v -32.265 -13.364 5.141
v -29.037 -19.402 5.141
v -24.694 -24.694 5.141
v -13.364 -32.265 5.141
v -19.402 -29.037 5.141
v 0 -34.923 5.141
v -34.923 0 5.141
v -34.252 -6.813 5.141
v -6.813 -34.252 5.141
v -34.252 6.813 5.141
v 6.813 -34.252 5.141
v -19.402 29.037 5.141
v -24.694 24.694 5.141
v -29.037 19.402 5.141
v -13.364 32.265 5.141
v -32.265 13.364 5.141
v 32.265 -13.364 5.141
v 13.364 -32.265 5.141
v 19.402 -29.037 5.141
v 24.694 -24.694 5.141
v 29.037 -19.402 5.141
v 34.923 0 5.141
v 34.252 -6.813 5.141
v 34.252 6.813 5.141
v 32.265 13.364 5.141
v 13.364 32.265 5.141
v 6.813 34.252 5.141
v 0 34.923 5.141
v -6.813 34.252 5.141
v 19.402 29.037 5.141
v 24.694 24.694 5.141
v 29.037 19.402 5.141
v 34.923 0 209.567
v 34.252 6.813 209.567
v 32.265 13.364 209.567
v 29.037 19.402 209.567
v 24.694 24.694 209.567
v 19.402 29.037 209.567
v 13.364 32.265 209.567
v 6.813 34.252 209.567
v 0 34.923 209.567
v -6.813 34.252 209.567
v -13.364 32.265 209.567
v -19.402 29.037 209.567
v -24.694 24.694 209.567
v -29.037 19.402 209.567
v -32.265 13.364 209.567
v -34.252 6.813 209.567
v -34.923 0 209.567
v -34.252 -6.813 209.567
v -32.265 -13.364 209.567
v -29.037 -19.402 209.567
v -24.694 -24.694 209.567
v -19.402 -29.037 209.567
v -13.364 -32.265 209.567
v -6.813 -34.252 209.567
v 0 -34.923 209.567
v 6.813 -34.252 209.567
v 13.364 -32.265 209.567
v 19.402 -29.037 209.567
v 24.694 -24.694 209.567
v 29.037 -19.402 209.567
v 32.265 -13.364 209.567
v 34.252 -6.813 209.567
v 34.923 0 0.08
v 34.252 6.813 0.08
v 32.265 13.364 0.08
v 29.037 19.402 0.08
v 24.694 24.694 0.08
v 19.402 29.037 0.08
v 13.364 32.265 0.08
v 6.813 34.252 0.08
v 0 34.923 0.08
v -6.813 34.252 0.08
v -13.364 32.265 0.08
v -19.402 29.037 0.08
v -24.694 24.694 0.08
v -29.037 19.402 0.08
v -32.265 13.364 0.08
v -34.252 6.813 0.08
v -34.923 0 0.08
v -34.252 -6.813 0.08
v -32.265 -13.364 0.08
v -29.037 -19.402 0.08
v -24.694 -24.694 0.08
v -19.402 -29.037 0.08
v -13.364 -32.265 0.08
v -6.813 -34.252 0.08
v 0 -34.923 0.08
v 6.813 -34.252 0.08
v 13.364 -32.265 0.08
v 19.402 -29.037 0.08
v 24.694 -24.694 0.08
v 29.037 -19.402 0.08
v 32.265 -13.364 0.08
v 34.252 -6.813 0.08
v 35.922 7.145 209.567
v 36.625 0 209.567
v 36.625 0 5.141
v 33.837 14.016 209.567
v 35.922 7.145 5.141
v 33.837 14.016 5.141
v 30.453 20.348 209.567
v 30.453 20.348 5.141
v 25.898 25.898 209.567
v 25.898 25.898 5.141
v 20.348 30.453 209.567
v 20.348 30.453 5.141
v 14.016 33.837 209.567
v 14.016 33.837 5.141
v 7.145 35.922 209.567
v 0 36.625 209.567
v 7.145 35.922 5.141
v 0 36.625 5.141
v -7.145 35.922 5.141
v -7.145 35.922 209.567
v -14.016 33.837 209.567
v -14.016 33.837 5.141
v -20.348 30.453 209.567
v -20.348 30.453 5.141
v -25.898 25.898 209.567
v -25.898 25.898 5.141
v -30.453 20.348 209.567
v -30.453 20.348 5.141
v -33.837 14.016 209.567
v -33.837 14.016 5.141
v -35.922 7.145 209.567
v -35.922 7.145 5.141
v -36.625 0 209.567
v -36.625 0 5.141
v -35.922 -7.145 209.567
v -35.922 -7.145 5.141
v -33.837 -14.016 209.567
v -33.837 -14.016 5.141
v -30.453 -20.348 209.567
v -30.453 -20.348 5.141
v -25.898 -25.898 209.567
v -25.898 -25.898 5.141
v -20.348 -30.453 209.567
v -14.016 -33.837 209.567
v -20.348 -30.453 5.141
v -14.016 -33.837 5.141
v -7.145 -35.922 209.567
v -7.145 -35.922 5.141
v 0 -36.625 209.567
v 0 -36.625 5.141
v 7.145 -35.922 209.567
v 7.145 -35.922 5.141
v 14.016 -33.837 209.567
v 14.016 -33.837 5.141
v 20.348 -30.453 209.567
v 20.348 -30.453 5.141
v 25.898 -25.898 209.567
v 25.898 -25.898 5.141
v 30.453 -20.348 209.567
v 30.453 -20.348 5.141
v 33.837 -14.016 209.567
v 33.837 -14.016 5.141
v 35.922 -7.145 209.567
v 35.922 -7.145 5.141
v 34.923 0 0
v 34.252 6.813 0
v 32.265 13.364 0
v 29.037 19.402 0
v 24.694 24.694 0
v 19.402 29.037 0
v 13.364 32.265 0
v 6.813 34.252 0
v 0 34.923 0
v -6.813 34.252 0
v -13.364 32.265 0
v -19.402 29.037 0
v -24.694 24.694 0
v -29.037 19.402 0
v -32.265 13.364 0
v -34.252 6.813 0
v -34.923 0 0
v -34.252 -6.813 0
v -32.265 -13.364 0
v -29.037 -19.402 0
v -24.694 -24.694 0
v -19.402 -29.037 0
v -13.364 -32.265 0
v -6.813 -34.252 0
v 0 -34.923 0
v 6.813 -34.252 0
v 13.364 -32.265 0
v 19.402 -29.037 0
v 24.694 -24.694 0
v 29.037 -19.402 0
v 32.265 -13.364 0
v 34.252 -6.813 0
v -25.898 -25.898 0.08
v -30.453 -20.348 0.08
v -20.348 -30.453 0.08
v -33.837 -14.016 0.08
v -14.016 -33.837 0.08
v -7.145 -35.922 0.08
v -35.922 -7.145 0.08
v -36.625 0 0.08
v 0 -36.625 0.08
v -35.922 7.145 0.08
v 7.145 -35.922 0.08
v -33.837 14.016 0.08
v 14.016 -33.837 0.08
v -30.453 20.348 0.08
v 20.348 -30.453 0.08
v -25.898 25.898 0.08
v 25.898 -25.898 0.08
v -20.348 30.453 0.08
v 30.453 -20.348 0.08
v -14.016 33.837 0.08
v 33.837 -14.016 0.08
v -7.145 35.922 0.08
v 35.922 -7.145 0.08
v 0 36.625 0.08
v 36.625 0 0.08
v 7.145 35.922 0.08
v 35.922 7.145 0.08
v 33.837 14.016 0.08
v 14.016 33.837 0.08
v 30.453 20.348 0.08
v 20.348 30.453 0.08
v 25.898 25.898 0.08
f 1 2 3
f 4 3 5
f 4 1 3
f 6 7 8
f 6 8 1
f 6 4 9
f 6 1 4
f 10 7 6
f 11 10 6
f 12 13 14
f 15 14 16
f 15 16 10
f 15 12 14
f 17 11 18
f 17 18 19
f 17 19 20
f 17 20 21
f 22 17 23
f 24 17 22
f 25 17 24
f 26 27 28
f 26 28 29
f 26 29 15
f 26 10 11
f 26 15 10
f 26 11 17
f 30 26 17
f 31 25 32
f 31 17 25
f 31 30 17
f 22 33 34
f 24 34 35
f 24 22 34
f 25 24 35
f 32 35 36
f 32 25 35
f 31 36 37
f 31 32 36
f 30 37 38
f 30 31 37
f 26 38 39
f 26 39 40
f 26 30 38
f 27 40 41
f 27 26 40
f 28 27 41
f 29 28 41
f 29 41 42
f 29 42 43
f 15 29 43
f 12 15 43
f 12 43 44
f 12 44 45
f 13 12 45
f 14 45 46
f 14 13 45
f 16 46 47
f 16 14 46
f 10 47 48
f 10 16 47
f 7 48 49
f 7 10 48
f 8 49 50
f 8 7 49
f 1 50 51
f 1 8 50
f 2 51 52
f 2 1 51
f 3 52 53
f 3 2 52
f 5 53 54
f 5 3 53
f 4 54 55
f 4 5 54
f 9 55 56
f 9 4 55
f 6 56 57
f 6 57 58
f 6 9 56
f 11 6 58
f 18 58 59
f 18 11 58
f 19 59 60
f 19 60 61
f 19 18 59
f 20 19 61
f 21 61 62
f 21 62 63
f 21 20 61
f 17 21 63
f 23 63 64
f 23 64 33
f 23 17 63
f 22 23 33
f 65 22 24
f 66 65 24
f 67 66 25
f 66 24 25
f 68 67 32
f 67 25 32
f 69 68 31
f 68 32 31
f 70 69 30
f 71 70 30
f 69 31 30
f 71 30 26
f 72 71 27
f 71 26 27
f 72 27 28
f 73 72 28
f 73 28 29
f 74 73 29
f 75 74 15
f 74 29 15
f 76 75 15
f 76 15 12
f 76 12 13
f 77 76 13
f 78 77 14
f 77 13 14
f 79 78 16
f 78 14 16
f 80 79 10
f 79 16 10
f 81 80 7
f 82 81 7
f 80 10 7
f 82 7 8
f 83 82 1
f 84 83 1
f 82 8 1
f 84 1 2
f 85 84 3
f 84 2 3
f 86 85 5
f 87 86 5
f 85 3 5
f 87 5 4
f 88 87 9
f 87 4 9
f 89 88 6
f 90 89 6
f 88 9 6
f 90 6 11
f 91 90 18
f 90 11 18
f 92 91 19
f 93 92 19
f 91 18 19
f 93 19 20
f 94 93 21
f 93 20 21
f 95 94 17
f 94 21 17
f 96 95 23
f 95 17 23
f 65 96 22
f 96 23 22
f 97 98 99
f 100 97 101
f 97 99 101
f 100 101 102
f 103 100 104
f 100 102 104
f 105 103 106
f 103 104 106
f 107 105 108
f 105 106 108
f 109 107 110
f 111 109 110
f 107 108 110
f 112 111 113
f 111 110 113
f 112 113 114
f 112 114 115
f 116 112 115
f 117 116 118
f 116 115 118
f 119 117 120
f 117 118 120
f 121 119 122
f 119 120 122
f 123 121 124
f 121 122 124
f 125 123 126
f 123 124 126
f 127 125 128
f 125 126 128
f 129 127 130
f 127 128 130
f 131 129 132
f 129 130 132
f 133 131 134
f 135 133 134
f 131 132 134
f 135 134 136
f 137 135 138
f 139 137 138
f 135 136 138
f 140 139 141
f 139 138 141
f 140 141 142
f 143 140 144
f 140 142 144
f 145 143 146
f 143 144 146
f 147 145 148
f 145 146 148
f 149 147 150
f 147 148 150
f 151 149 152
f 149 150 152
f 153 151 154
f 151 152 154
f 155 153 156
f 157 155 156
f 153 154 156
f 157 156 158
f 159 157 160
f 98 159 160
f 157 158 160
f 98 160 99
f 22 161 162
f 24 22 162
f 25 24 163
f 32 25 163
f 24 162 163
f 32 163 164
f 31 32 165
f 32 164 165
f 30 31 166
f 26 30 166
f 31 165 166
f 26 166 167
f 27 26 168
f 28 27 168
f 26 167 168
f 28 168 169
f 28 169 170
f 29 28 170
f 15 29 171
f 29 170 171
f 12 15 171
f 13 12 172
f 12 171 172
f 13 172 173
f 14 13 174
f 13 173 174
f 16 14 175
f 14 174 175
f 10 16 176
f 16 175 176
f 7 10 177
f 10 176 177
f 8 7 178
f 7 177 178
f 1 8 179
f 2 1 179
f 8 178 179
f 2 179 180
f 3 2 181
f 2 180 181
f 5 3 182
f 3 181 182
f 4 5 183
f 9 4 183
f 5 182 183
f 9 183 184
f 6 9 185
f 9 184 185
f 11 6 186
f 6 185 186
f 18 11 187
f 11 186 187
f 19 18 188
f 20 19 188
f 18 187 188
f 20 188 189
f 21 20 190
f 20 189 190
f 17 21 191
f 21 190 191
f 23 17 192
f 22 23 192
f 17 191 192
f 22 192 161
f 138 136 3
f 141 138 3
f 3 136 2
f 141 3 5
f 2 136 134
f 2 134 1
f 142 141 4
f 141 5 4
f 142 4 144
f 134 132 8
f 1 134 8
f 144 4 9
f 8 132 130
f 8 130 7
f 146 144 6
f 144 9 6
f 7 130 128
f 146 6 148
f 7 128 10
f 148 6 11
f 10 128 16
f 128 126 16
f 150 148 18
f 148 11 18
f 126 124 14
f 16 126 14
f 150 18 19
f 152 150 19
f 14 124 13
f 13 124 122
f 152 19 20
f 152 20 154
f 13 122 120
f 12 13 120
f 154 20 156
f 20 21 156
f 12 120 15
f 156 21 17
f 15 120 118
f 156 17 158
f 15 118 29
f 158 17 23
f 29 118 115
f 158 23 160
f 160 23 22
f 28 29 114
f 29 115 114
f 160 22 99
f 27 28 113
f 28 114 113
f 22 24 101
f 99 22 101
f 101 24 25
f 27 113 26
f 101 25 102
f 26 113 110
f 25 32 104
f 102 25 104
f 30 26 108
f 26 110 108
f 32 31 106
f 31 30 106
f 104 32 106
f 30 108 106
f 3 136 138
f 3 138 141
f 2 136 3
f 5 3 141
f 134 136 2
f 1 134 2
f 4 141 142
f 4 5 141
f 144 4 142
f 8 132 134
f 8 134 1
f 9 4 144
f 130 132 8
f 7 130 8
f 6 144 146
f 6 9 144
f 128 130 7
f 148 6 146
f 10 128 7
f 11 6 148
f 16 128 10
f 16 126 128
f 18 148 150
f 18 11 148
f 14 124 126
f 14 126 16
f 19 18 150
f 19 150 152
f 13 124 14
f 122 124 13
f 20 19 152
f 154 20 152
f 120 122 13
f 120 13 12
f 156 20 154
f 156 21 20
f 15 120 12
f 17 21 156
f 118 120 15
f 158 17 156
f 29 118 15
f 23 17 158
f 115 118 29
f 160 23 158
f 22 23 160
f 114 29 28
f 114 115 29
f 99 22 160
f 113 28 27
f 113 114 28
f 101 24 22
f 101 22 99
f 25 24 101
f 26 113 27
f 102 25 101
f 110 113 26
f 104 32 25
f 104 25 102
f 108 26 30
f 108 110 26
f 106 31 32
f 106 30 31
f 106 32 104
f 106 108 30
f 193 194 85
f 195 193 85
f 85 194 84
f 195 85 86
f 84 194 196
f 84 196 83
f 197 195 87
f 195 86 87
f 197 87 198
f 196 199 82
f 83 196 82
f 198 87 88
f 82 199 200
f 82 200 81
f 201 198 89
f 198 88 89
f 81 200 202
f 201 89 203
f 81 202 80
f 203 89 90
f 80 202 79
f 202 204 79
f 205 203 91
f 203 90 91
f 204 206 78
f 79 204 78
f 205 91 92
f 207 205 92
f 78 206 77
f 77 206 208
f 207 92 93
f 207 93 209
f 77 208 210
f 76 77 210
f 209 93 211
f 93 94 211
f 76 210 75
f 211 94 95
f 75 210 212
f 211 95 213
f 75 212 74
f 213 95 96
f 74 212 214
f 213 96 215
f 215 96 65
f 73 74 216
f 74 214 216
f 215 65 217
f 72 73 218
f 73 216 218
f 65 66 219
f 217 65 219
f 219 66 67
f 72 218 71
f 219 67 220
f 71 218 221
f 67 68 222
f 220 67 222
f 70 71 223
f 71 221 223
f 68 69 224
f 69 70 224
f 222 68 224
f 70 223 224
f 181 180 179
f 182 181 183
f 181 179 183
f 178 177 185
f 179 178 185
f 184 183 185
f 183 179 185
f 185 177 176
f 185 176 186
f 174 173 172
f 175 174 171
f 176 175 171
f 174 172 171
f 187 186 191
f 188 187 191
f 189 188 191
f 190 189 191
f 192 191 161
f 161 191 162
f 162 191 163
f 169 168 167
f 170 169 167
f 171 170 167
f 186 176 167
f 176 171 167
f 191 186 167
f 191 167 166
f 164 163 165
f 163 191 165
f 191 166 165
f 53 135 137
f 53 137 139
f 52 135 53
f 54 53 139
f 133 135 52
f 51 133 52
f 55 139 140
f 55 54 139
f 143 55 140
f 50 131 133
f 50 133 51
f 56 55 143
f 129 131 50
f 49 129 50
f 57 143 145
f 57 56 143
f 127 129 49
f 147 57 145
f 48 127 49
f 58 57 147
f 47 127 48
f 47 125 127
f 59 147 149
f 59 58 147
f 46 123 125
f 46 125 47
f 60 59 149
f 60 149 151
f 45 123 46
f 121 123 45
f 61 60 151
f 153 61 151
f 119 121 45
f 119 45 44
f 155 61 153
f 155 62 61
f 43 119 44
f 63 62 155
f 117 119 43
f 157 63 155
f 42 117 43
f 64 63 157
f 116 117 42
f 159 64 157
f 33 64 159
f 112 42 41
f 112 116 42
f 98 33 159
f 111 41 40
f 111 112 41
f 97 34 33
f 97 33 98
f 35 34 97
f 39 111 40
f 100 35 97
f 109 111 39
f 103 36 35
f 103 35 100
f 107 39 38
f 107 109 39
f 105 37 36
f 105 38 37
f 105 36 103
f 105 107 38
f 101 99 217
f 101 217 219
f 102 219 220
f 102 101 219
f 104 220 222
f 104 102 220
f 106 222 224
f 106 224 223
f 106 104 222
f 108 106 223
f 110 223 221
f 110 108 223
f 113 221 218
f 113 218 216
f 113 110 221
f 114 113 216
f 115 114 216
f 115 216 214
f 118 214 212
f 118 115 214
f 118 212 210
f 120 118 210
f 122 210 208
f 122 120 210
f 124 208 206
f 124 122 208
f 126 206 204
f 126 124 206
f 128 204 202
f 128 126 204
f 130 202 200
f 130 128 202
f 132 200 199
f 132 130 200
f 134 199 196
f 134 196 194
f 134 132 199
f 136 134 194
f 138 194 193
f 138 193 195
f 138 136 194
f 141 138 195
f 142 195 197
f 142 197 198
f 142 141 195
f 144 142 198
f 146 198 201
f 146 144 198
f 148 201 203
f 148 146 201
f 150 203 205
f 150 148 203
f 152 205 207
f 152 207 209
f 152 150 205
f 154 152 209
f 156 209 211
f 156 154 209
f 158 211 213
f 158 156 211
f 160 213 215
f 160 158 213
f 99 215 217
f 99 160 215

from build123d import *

# Parameters (mm, degrees)
F0_R     = 34.9228437671
F1_DEPTH = 5.14146
F2_R     = 36.6253816168
F2_R_2   = 34.9228437671
F3_DEPTH = 204.42603
F4_DEPTH = 5.06109


with BuildPart() as f1:
    # F0 (on Top) → F1 (new body)
    with BuildSketch(Plane.XY):
        Circle(F0_R)
    extrude(amount=F1_DEPTH)


with BuildPart() as f3:
    # F2 (on face) → F3 (new body)
    with BuildSketch(Plane.XY.offset(5.14146)):
        Circle(F2_R)
        Circle(F2_R_2, mode=Mode.SUBTRACT)
    extrude(amount=F3_DEPTH)


with BuildPart() as f4:
    # F4 (new): a face of the model
    f4_faces = [f3.part.faces().sort_by_distance(p)[0] for p in [
        (-35.5894593887, 0, 5.14146),
    ]]
    extrude(f4_faces, amount=F4_DEPTH)


solid = Compound([f1.part, f3.part, f4.part])
